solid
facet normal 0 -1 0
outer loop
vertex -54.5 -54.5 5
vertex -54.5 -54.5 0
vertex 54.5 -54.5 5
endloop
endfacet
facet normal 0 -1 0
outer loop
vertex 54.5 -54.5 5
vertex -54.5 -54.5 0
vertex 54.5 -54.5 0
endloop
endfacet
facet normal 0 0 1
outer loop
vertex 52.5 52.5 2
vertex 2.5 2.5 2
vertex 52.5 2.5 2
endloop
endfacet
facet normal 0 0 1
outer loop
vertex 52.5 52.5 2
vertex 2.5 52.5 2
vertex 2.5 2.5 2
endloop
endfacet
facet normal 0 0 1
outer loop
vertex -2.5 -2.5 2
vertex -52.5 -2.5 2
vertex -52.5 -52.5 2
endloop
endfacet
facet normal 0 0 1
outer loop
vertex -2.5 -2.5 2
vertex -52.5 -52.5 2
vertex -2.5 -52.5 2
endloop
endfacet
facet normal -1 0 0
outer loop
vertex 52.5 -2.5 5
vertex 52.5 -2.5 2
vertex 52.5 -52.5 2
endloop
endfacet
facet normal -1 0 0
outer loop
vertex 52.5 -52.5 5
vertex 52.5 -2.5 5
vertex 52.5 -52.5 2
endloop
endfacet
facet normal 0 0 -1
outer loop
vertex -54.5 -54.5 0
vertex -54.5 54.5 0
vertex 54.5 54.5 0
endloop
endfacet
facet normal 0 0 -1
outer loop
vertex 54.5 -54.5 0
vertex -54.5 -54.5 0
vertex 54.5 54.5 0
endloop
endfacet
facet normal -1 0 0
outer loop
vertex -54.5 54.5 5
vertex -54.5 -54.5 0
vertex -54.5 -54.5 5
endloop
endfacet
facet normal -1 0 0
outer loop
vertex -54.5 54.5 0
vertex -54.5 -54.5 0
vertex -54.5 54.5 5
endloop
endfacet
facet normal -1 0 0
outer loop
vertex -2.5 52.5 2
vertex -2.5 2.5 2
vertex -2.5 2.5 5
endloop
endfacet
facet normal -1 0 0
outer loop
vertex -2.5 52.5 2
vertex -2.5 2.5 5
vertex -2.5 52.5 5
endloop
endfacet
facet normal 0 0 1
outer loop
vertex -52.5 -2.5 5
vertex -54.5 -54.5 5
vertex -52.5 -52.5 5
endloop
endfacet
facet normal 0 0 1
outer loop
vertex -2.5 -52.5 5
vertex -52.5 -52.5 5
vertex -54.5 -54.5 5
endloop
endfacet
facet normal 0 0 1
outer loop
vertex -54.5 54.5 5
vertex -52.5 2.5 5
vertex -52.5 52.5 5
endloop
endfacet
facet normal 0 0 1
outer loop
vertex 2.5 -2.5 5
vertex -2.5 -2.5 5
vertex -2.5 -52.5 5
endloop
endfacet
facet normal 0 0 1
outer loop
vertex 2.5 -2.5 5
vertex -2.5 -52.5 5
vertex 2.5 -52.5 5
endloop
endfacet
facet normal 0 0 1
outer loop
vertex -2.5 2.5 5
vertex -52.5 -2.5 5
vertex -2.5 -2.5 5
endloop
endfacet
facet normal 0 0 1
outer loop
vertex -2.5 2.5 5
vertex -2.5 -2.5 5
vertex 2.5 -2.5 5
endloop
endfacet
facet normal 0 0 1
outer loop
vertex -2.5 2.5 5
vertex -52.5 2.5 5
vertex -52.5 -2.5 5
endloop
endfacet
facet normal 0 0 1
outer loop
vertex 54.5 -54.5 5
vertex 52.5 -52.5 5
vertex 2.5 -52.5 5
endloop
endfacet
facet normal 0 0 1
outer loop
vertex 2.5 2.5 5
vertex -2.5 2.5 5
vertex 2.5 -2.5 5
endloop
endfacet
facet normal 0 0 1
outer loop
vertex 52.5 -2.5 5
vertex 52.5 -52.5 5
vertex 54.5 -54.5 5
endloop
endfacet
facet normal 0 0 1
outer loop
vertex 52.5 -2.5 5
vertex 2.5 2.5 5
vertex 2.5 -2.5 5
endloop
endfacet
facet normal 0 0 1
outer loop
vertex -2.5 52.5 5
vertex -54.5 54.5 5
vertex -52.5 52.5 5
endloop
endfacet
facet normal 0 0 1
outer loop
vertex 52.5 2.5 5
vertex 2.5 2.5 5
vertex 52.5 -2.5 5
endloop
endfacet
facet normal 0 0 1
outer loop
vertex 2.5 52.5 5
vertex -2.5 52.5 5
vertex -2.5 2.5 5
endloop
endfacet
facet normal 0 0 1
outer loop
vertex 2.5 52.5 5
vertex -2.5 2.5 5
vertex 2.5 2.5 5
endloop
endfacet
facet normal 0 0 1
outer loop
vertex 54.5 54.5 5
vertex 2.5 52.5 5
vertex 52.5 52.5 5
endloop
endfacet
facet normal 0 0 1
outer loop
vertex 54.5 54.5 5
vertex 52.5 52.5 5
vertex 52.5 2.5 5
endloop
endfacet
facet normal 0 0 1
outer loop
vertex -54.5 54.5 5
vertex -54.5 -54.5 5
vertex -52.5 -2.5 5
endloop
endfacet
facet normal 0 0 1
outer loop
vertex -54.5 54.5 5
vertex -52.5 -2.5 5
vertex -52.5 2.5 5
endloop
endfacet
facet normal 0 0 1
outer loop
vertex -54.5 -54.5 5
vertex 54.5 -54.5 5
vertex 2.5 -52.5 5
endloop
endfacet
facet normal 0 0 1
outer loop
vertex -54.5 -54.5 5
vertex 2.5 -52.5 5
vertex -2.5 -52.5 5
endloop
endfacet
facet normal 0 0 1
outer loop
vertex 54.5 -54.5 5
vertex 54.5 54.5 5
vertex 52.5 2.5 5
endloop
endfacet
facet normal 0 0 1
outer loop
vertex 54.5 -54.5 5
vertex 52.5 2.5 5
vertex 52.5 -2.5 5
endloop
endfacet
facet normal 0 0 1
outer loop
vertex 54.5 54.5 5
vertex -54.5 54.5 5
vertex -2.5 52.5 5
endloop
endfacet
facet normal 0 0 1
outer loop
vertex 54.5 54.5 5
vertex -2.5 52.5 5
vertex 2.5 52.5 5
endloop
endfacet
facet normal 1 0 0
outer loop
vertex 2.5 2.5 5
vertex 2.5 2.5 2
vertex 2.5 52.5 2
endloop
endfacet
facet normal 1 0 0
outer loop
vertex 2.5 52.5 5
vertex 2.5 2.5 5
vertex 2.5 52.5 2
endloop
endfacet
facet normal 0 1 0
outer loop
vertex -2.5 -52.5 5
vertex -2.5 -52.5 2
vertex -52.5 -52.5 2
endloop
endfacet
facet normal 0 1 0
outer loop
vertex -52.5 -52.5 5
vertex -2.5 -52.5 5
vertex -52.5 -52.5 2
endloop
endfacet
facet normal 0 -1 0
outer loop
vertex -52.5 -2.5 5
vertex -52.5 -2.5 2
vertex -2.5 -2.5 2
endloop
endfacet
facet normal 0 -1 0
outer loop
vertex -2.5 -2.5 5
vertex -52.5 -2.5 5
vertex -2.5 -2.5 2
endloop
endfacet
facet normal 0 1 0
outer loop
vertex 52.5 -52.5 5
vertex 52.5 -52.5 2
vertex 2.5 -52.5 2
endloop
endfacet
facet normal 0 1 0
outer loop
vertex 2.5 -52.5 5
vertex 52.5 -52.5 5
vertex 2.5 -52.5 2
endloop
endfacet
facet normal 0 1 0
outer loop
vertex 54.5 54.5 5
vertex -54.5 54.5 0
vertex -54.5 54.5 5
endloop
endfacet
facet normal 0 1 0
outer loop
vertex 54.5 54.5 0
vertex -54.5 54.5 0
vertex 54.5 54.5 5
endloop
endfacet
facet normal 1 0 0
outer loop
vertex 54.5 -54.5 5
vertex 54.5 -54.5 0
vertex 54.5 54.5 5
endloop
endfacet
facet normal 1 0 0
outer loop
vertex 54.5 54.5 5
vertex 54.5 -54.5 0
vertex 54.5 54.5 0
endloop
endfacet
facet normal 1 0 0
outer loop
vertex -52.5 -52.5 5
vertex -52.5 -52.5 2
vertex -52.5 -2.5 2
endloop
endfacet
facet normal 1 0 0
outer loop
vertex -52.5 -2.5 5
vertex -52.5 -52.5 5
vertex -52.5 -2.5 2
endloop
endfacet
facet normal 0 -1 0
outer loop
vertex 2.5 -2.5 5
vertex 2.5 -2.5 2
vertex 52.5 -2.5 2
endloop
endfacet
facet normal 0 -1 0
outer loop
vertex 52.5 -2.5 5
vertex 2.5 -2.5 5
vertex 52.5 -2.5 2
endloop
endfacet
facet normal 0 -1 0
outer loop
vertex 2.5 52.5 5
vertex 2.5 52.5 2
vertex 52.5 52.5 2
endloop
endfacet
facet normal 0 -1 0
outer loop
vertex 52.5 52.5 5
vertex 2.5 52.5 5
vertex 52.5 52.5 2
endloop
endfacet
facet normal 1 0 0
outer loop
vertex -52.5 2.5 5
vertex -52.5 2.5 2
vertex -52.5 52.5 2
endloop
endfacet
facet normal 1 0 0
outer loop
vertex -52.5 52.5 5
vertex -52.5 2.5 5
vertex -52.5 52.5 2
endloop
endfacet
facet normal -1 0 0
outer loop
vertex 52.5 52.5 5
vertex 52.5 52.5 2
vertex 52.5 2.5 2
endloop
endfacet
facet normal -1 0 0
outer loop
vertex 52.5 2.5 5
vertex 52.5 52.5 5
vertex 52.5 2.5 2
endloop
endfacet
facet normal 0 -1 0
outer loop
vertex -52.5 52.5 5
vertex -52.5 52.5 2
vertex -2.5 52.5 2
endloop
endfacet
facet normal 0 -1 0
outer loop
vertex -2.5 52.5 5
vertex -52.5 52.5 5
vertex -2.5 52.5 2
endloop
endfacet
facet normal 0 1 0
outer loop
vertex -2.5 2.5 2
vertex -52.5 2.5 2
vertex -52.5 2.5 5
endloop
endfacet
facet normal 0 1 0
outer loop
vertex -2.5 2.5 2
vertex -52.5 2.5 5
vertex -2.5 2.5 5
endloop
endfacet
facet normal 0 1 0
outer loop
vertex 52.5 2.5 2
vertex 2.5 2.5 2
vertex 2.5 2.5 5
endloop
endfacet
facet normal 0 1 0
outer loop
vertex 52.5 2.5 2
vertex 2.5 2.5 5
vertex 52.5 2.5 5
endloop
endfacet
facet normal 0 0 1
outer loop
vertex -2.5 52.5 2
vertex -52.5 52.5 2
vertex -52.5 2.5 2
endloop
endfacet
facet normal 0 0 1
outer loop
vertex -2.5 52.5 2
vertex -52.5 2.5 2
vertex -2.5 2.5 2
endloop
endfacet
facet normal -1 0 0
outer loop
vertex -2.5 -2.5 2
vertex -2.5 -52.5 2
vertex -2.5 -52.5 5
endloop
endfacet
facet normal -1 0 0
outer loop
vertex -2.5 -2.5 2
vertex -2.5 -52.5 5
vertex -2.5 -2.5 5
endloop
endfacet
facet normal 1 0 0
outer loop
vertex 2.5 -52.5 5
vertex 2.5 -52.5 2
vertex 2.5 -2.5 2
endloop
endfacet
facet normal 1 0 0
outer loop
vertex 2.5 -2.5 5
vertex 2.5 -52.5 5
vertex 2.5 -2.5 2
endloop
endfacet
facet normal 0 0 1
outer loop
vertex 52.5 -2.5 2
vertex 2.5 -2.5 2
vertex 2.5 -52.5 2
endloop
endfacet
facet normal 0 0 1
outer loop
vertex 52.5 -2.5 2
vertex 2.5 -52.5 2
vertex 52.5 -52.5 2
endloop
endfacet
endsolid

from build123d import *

# Parameters (mm, degrees)
F0_W     = 109
F0_H     = 109
F0_W_2   = 5
F0_H_2   = 5
F0_W_3   = 50
F0_H_3   = 50
F1_DEPTH = 2
F2_DEPTH = 5


with BuildPart() as f1:
    # F0 (on Top) → F1 (new body)
    with BuildSketch(Plane.XY):
        Rectangle(F0_W, F0_H)
        Polygon((-2.5, -52.5), (-52.5, -52.5), (-52.5, -2.5), (-52.5, 2.5), (-52.5, 52.5), (-2.5, 52.5), (2.5, 52.5), (52.5, 52.5), (52.5, 2.5), (52.5, -2.5), (52.5, -52.5), (2.5, -52.5), align=None, mode=Mode.SUBTRACT)
        Rectangle(F0_W_2, F0_H_2)
        with Locations((-27.5, 27.5)):
            Rectangle(F0_W_3, F0_H_3)
        with Locations((-27.5, -27.5)):
            Rectangle(F0_W_3, F0_H_3)
        with Locations((27.5, -27.5)):
            Rectangle(F0_W_3, F0_H_3)
        with Locations((27.5, 27.5)):
            Rectangle(F0_W_3, F0_H_3)
        with Locations((0, 27.5)):
            Rectangle(F0_W_2, F0_H_3)
        with Locations((27.5, 0)):
            Rectangle(F0_W_3, F0_H_2)
        with Locations((0, -27.5)):
            Rectangle(F0_W_2, F0_H_3)
        with Locations((-27.5, 0)):
            Rectangle(F0_W_3, F0_H_2)
    extrude(amount=F1_DEPTH)

    # F0 (on Top) → F2 (join)
    with BuildSketch(Plane.XY):
        Rectangle(F0_W, F0_H)
        Polygon((-2.5, -52.5), (-52.5, -52.5), (-52.5, -2.5), (-52.5, 2.5), (-52.5, 52.5), (-2.5, 52.5), (2.5, 52.5), (52.5, 52.5), (52.5, 2.5), (52.5, -2.5), (52.5, -52.5), (2.5, -52.5), align=None, mode=Mode.SUBTRACT)
        with Locations((0, -27.5)):
            Rectangle(F0_W_2, F0_H_3)
        with Locations((27.5, 0)):
            Rectangle(F0_W_3, F0_H_2)
        with Locations((-27.5, 0)):
            Rectangle(F0_W_3, F0_H_2)
        with Locations((0, 27.5)):
            Rectangle(F0_W_2, F0_H_3)
        Rectangle(F0_W_2, F0_H_2)
    extrude(amount=F2_DEPTH)


solid = f1.part
